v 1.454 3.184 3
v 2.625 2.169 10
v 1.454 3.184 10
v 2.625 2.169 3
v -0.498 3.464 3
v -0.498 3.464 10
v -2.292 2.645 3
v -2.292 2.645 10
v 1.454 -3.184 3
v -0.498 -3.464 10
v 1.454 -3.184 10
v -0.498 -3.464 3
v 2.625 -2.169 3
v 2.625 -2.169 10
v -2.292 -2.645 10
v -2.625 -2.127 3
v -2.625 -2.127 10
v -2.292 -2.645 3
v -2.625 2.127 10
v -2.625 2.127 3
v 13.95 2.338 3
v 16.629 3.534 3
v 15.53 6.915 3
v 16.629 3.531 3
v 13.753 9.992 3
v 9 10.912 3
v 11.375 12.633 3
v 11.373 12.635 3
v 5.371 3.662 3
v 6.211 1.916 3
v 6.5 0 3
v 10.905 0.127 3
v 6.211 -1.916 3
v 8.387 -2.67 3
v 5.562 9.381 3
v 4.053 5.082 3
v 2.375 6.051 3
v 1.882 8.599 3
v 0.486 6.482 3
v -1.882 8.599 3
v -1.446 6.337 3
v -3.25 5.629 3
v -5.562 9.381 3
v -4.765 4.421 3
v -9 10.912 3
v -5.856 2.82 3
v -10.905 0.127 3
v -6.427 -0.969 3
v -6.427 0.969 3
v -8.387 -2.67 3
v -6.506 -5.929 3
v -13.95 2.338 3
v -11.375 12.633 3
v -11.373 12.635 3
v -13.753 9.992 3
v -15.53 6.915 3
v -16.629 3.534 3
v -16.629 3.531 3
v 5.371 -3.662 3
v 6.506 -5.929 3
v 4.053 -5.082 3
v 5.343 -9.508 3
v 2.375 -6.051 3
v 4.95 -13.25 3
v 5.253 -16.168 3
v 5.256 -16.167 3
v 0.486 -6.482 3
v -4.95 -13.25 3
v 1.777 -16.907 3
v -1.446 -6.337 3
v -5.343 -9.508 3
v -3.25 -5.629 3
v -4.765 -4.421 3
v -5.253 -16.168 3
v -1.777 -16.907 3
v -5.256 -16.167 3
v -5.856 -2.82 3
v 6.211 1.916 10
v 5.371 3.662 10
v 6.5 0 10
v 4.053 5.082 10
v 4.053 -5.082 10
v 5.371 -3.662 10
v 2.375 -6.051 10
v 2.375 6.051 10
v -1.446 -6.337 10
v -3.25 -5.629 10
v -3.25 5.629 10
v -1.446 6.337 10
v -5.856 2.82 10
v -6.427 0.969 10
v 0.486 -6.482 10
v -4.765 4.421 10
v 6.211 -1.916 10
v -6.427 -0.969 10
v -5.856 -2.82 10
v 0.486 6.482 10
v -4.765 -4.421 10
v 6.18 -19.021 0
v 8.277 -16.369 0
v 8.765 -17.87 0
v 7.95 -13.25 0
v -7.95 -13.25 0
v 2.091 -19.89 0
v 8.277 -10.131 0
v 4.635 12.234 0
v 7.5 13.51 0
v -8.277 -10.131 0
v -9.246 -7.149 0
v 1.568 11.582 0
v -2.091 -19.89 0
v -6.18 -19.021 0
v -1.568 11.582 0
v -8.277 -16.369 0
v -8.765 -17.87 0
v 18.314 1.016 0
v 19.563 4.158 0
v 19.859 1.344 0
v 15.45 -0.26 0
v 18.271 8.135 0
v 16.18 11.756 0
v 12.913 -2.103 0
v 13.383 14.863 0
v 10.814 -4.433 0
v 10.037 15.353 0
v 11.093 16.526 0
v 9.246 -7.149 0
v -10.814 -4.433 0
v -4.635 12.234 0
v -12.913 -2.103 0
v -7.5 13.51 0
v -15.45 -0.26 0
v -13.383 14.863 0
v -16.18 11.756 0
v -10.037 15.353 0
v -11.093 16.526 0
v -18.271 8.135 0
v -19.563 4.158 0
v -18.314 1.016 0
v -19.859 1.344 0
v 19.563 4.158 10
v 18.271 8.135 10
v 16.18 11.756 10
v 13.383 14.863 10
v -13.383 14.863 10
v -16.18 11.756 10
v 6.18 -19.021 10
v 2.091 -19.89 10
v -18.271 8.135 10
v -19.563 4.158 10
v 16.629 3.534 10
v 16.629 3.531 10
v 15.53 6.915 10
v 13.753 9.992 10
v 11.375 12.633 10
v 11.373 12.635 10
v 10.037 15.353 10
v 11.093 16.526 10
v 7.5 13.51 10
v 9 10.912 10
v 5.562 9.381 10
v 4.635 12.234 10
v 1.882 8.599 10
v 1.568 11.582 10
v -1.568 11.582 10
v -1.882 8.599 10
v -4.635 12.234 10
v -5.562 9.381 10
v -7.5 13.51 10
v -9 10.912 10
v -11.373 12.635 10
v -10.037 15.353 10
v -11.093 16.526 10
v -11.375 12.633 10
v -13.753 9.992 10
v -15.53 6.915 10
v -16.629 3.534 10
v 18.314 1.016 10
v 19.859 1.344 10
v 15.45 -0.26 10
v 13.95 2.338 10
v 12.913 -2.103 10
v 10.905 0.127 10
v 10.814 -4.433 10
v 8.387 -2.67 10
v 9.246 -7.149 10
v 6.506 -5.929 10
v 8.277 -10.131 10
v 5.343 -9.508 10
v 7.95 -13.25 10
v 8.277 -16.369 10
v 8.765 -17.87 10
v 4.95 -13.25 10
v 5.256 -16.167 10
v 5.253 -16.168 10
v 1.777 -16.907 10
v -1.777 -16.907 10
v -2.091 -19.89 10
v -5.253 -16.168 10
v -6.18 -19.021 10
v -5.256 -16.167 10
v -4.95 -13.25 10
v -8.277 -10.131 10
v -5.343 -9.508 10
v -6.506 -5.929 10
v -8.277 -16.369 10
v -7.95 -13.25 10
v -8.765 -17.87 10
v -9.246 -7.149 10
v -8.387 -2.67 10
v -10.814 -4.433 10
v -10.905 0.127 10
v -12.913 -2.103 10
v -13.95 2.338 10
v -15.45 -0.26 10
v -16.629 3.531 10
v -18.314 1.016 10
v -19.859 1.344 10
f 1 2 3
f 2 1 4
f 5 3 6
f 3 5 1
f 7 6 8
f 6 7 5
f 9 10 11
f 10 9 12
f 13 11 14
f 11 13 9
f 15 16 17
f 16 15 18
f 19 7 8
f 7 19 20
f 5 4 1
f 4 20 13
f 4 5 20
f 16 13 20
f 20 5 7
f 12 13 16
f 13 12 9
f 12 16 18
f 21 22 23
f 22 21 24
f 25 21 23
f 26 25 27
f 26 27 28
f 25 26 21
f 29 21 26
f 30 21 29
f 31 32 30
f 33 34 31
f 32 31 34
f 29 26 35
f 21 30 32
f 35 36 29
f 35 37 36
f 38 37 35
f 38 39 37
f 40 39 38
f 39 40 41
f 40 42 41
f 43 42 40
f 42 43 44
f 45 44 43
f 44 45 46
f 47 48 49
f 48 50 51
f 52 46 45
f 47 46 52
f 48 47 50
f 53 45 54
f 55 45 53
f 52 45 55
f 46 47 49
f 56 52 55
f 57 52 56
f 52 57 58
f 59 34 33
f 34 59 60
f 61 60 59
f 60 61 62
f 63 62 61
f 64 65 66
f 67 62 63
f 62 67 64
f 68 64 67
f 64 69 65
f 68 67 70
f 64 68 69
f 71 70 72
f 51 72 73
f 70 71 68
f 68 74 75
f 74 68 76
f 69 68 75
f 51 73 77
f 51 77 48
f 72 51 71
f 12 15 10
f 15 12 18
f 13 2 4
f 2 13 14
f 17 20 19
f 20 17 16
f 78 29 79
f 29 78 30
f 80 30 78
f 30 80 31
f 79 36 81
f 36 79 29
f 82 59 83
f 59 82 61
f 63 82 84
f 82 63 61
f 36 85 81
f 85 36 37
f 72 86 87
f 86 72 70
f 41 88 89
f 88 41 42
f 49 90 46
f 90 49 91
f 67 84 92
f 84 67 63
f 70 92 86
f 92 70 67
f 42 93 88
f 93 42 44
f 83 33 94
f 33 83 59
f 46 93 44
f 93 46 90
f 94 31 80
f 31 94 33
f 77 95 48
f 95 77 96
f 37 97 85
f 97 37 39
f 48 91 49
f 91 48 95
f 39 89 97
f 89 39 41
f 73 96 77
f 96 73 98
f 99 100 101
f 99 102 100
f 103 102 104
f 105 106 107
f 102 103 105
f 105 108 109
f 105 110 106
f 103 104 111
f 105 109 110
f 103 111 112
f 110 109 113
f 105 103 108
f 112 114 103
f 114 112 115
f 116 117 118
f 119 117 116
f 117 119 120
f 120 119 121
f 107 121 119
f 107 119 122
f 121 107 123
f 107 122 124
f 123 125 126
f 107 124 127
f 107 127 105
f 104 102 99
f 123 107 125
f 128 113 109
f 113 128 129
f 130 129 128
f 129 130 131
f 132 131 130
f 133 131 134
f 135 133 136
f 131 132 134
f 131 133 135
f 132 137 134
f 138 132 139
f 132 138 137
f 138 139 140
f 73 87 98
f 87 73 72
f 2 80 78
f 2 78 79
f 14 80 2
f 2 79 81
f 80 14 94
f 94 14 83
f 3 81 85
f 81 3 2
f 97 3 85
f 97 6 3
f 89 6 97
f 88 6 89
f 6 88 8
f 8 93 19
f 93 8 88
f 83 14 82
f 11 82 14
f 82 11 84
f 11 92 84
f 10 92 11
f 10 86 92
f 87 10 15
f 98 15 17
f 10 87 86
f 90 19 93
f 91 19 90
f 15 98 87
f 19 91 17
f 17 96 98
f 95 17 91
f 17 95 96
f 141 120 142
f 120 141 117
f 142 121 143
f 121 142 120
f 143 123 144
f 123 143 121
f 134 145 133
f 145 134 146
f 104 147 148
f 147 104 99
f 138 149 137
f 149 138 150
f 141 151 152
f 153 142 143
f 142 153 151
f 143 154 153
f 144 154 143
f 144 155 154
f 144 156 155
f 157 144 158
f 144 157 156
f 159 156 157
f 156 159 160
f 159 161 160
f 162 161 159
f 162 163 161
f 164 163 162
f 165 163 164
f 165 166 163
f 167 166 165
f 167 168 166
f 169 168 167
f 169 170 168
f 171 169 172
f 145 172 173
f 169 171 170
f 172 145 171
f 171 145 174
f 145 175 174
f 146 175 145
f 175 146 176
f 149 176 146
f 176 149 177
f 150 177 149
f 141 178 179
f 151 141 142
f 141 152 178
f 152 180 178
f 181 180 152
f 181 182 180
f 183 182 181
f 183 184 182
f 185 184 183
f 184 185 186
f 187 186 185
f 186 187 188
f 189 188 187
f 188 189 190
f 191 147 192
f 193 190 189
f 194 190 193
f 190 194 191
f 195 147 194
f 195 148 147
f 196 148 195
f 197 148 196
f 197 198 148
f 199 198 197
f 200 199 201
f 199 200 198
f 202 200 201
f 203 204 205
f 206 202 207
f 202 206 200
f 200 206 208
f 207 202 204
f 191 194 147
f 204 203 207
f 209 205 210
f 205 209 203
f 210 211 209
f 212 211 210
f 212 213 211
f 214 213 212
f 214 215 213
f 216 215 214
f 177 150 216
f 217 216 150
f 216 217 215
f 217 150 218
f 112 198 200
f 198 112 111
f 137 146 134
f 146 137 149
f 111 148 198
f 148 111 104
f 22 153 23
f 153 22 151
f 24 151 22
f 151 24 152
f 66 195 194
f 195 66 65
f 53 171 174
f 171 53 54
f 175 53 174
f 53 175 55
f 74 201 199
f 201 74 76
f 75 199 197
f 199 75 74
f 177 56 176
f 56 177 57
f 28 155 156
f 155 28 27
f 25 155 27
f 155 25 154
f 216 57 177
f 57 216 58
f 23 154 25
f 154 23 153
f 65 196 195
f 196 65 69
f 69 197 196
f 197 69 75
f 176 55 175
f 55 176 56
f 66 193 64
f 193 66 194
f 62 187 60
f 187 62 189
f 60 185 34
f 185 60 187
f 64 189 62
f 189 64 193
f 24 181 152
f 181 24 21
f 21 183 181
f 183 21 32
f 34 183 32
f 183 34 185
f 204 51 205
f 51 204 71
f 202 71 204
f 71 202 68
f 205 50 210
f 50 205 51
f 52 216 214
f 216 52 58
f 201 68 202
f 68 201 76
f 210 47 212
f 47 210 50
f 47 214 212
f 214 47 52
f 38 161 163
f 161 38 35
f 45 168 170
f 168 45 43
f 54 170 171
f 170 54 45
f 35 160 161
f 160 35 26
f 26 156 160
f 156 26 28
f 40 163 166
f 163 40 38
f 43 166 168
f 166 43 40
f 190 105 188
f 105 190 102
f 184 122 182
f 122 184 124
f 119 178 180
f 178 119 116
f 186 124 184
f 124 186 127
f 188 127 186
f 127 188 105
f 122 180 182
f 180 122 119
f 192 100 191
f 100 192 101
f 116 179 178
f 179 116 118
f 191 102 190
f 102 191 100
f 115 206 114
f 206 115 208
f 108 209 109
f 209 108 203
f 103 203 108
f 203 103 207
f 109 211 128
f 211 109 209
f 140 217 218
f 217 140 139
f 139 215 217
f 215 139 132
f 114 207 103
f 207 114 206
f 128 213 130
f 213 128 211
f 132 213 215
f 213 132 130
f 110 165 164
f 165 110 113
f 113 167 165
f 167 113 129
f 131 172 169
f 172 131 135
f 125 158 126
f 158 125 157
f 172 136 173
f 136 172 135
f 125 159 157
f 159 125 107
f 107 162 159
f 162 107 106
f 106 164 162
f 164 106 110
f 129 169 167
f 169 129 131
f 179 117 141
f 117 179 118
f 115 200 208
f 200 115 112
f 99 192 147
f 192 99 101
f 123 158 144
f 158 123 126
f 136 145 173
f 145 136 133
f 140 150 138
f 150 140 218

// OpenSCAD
thickness=10;
outer_r=20;
knob_r=15;
bolt_r=3.5;
wall_thickness=3;
square_ratio=1.5;


union(){
	difference(){
		cylinder(r=bolt_r+wall_thickness,h=thickness);
		intersection(){
			translate([0,0,wall_thickness])cylinder(r=bolt_r,h=thickness);
			translate([-square_ratio*.5*bolt_r,-bolt_r*2,wall_thickness])cube([square_ratio*bolt_r,bolt_r*4,thickness]);
		}
	}
	intersection(){
		difference(){
			union(){
				difference(){
					cylinder(r=outer_r,h=thickness);
					translate([0,0,wall_thickness])cylinder(r=outer_r-wall_thickness,h=thickness);
					}
				translate([(outer_r+bolt_r+wall_thickness)*sin(120),(outer_r+bolt_r+wall_thickness)*cos(120),0])cylinder(r=knob_r+wall_thickness,h=thickness);
				translate([(outer_r+bolt_r+wall_thickness)*sin(240),(outer_r+bolt_r+wall_thickness)*cos(240),0])cylinder(r=knob_r+wall_thickness,h=thickness);
				translate([(outer_r+bolt_r+wall_thickness)*sin(360),(outer_r+bolt_r+wall_thickness)*cos(360),0])cylinder(r=knob_r+wall_thickness,h=thickness);
			}

			translate([(outer_r+bolt_r+wall_thickness)*sin(120),(outer_r+bolt_r+wall_thickness)*cos(120),-wall_thickness])cylinder(r=knob_r,h=thickness+wall_thickness*2);
			translate([(outer_r+bolt_r+wall_thickness)*sin(240),(outer_r+bolt_r+wall_thickness)*cos(240),-wall_thickness])cylinder(r=knob_r,h=thickness+wall_thickness*2);
			translate([(outer_r+bolt_r+wall_thickness)*sin(360),(outer_r+bolt_r+wall_thickness)*cos(360),-wall_thickness])cylinder(r=knob_r,h=thickness+wall_thickness*2);
		}
	cylinder(r=outer_r,h=thickness);
	}
}
